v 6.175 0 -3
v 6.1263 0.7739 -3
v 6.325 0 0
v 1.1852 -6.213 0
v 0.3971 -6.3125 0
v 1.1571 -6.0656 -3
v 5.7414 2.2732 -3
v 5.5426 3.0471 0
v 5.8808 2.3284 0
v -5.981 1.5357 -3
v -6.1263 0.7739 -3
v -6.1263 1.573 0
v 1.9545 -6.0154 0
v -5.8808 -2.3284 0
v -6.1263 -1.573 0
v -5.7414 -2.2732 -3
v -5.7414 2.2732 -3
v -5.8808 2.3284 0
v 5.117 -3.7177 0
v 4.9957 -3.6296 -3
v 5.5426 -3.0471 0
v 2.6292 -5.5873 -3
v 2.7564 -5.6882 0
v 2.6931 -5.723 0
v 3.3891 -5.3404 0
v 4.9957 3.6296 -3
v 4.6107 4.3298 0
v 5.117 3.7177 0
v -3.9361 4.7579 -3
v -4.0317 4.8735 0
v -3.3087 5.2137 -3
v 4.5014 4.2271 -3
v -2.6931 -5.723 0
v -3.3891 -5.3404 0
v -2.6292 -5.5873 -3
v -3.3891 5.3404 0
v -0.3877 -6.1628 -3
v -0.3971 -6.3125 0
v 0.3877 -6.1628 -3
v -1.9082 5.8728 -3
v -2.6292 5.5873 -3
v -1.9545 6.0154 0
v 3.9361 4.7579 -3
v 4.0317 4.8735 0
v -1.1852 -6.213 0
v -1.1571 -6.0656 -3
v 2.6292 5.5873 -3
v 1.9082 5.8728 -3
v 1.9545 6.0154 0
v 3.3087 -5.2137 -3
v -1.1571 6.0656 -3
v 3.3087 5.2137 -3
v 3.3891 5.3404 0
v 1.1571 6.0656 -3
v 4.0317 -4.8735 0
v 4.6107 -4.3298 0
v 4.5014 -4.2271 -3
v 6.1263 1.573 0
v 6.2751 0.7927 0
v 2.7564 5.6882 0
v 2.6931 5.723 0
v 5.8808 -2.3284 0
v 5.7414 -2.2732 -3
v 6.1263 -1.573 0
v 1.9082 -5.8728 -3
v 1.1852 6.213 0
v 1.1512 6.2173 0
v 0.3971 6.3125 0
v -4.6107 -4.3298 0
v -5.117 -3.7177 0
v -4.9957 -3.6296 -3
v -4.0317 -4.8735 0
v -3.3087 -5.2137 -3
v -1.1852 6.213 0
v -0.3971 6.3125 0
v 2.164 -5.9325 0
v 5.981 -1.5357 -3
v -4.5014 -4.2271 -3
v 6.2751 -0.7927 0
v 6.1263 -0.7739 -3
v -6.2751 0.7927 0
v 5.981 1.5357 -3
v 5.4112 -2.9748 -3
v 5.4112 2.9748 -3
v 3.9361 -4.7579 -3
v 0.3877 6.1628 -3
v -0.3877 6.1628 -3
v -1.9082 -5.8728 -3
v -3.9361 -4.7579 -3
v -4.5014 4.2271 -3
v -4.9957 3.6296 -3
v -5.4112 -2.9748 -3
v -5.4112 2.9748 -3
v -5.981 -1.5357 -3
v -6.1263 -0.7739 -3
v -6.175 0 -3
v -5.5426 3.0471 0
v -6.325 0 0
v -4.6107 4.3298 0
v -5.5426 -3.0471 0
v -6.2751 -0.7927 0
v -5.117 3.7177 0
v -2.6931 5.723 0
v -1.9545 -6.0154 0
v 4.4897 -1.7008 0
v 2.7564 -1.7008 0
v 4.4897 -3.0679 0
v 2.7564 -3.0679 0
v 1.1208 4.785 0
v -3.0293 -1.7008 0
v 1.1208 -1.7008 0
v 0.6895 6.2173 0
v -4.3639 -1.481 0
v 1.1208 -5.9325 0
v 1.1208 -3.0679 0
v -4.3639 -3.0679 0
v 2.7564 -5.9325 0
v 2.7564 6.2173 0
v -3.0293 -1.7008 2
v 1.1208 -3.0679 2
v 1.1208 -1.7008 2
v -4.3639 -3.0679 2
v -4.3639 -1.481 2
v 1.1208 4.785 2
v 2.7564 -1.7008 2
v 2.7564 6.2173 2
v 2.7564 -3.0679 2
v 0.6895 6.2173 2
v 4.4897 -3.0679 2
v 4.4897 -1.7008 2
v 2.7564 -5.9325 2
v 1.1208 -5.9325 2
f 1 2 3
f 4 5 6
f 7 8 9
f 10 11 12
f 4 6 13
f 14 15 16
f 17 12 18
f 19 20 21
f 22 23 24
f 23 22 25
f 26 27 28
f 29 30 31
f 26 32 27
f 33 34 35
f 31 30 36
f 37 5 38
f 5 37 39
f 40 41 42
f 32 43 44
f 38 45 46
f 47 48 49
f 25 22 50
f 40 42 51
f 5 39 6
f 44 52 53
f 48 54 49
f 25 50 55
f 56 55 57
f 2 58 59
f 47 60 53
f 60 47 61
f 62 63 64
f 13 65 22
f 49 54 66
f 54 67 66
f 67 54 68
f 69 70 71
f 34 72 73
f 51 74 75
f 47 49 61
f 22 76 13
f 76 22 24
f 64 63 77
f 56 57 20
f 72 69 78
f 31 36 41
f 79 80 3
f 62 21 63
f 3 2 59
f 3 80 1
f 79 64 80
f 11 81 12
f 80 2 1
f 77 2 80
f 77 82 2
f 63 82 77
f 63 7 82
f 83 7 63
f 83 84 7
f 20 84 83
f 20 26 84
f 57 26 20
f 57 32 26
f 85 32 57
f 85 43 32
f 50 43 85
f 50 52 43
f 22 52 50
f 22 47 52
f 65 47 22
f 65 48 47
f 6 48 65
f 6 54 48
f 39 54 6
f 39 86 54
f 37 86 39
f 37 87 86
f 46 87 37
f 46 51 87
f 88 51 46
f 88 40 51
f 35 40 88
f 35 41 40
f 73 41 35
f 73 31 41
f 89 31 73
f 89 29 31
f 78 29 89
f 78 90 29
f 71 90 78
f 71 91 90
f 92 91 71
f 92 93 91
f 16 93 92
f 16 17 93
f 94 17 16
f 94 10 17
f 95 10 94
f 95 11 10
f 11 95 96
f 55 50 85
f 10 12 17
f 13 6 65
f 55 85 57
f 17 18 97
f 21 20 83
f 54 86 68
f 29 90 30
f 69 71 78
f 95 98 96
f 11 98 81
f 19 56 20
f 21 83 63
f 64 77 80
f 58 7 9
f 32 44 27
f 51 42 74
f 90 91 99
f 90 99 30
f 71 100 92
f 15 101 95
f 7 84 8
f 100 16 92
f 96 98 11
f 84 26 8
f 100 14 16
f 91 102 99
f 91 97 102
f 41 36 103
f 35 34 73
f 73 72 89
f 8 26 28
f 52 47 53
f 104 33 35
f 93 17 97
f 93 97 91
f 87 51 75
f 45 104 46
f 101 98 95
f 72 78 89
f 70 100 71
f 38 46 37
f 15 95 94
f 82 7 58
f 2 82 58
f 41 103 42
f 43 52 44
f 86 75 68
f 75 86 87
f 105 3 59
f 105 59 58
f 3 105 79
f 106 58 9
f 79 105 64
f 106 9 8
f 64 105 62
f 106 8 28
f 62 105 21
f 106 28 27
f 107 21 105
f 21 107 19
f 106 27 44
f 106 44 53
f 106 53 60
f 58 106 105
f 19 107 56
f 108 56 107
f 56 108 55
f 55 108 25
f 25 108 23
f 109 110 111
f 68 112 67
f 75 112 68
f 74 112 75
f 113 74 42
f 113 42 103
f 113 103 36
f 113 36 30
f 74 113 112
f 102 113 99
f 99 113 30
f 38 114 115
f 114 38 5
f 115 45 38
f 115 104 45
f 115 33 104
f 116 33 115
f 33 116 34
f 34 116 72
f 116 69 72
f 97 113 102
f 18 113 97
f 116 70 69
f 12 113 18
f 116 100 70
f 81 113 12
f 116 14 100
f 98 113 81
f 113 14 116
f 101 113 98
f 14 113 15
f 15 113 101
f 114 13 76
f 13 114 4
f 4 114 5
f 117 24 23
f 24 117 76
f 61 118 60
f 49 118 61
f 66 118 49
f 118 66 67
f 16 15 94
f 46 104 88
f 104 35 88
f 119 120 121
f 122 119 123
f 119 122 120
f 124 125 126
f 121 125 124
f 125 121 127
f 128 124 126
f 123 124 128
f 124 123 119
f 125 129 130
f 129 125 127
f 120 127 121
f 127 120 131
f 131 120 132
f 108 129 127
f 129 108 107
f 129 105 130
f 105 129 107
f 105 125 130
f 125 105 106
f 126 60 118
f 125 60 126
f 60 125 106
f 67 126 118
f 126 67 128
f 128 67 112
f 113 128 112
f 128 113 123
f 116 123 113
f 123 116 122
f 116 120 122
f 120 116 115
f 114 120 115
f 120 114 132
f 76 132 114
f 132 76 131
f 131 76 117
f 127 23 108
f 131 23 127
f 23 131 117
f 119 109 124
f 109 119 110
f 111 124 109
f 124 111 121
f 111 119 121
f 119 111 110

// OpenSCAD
$fn = 50;

difference() {
	union() {
		translate(v = [0, 0, -3.0]) {
			cylinder(h = 3, r1 = 6.175, r2 = 6.325);
		}
		linear_extrude(height = 2) {
			text(font = "Impact", halign = "center", size = 12, text = "4", valign = "center");
		}
	}
	union();
}
